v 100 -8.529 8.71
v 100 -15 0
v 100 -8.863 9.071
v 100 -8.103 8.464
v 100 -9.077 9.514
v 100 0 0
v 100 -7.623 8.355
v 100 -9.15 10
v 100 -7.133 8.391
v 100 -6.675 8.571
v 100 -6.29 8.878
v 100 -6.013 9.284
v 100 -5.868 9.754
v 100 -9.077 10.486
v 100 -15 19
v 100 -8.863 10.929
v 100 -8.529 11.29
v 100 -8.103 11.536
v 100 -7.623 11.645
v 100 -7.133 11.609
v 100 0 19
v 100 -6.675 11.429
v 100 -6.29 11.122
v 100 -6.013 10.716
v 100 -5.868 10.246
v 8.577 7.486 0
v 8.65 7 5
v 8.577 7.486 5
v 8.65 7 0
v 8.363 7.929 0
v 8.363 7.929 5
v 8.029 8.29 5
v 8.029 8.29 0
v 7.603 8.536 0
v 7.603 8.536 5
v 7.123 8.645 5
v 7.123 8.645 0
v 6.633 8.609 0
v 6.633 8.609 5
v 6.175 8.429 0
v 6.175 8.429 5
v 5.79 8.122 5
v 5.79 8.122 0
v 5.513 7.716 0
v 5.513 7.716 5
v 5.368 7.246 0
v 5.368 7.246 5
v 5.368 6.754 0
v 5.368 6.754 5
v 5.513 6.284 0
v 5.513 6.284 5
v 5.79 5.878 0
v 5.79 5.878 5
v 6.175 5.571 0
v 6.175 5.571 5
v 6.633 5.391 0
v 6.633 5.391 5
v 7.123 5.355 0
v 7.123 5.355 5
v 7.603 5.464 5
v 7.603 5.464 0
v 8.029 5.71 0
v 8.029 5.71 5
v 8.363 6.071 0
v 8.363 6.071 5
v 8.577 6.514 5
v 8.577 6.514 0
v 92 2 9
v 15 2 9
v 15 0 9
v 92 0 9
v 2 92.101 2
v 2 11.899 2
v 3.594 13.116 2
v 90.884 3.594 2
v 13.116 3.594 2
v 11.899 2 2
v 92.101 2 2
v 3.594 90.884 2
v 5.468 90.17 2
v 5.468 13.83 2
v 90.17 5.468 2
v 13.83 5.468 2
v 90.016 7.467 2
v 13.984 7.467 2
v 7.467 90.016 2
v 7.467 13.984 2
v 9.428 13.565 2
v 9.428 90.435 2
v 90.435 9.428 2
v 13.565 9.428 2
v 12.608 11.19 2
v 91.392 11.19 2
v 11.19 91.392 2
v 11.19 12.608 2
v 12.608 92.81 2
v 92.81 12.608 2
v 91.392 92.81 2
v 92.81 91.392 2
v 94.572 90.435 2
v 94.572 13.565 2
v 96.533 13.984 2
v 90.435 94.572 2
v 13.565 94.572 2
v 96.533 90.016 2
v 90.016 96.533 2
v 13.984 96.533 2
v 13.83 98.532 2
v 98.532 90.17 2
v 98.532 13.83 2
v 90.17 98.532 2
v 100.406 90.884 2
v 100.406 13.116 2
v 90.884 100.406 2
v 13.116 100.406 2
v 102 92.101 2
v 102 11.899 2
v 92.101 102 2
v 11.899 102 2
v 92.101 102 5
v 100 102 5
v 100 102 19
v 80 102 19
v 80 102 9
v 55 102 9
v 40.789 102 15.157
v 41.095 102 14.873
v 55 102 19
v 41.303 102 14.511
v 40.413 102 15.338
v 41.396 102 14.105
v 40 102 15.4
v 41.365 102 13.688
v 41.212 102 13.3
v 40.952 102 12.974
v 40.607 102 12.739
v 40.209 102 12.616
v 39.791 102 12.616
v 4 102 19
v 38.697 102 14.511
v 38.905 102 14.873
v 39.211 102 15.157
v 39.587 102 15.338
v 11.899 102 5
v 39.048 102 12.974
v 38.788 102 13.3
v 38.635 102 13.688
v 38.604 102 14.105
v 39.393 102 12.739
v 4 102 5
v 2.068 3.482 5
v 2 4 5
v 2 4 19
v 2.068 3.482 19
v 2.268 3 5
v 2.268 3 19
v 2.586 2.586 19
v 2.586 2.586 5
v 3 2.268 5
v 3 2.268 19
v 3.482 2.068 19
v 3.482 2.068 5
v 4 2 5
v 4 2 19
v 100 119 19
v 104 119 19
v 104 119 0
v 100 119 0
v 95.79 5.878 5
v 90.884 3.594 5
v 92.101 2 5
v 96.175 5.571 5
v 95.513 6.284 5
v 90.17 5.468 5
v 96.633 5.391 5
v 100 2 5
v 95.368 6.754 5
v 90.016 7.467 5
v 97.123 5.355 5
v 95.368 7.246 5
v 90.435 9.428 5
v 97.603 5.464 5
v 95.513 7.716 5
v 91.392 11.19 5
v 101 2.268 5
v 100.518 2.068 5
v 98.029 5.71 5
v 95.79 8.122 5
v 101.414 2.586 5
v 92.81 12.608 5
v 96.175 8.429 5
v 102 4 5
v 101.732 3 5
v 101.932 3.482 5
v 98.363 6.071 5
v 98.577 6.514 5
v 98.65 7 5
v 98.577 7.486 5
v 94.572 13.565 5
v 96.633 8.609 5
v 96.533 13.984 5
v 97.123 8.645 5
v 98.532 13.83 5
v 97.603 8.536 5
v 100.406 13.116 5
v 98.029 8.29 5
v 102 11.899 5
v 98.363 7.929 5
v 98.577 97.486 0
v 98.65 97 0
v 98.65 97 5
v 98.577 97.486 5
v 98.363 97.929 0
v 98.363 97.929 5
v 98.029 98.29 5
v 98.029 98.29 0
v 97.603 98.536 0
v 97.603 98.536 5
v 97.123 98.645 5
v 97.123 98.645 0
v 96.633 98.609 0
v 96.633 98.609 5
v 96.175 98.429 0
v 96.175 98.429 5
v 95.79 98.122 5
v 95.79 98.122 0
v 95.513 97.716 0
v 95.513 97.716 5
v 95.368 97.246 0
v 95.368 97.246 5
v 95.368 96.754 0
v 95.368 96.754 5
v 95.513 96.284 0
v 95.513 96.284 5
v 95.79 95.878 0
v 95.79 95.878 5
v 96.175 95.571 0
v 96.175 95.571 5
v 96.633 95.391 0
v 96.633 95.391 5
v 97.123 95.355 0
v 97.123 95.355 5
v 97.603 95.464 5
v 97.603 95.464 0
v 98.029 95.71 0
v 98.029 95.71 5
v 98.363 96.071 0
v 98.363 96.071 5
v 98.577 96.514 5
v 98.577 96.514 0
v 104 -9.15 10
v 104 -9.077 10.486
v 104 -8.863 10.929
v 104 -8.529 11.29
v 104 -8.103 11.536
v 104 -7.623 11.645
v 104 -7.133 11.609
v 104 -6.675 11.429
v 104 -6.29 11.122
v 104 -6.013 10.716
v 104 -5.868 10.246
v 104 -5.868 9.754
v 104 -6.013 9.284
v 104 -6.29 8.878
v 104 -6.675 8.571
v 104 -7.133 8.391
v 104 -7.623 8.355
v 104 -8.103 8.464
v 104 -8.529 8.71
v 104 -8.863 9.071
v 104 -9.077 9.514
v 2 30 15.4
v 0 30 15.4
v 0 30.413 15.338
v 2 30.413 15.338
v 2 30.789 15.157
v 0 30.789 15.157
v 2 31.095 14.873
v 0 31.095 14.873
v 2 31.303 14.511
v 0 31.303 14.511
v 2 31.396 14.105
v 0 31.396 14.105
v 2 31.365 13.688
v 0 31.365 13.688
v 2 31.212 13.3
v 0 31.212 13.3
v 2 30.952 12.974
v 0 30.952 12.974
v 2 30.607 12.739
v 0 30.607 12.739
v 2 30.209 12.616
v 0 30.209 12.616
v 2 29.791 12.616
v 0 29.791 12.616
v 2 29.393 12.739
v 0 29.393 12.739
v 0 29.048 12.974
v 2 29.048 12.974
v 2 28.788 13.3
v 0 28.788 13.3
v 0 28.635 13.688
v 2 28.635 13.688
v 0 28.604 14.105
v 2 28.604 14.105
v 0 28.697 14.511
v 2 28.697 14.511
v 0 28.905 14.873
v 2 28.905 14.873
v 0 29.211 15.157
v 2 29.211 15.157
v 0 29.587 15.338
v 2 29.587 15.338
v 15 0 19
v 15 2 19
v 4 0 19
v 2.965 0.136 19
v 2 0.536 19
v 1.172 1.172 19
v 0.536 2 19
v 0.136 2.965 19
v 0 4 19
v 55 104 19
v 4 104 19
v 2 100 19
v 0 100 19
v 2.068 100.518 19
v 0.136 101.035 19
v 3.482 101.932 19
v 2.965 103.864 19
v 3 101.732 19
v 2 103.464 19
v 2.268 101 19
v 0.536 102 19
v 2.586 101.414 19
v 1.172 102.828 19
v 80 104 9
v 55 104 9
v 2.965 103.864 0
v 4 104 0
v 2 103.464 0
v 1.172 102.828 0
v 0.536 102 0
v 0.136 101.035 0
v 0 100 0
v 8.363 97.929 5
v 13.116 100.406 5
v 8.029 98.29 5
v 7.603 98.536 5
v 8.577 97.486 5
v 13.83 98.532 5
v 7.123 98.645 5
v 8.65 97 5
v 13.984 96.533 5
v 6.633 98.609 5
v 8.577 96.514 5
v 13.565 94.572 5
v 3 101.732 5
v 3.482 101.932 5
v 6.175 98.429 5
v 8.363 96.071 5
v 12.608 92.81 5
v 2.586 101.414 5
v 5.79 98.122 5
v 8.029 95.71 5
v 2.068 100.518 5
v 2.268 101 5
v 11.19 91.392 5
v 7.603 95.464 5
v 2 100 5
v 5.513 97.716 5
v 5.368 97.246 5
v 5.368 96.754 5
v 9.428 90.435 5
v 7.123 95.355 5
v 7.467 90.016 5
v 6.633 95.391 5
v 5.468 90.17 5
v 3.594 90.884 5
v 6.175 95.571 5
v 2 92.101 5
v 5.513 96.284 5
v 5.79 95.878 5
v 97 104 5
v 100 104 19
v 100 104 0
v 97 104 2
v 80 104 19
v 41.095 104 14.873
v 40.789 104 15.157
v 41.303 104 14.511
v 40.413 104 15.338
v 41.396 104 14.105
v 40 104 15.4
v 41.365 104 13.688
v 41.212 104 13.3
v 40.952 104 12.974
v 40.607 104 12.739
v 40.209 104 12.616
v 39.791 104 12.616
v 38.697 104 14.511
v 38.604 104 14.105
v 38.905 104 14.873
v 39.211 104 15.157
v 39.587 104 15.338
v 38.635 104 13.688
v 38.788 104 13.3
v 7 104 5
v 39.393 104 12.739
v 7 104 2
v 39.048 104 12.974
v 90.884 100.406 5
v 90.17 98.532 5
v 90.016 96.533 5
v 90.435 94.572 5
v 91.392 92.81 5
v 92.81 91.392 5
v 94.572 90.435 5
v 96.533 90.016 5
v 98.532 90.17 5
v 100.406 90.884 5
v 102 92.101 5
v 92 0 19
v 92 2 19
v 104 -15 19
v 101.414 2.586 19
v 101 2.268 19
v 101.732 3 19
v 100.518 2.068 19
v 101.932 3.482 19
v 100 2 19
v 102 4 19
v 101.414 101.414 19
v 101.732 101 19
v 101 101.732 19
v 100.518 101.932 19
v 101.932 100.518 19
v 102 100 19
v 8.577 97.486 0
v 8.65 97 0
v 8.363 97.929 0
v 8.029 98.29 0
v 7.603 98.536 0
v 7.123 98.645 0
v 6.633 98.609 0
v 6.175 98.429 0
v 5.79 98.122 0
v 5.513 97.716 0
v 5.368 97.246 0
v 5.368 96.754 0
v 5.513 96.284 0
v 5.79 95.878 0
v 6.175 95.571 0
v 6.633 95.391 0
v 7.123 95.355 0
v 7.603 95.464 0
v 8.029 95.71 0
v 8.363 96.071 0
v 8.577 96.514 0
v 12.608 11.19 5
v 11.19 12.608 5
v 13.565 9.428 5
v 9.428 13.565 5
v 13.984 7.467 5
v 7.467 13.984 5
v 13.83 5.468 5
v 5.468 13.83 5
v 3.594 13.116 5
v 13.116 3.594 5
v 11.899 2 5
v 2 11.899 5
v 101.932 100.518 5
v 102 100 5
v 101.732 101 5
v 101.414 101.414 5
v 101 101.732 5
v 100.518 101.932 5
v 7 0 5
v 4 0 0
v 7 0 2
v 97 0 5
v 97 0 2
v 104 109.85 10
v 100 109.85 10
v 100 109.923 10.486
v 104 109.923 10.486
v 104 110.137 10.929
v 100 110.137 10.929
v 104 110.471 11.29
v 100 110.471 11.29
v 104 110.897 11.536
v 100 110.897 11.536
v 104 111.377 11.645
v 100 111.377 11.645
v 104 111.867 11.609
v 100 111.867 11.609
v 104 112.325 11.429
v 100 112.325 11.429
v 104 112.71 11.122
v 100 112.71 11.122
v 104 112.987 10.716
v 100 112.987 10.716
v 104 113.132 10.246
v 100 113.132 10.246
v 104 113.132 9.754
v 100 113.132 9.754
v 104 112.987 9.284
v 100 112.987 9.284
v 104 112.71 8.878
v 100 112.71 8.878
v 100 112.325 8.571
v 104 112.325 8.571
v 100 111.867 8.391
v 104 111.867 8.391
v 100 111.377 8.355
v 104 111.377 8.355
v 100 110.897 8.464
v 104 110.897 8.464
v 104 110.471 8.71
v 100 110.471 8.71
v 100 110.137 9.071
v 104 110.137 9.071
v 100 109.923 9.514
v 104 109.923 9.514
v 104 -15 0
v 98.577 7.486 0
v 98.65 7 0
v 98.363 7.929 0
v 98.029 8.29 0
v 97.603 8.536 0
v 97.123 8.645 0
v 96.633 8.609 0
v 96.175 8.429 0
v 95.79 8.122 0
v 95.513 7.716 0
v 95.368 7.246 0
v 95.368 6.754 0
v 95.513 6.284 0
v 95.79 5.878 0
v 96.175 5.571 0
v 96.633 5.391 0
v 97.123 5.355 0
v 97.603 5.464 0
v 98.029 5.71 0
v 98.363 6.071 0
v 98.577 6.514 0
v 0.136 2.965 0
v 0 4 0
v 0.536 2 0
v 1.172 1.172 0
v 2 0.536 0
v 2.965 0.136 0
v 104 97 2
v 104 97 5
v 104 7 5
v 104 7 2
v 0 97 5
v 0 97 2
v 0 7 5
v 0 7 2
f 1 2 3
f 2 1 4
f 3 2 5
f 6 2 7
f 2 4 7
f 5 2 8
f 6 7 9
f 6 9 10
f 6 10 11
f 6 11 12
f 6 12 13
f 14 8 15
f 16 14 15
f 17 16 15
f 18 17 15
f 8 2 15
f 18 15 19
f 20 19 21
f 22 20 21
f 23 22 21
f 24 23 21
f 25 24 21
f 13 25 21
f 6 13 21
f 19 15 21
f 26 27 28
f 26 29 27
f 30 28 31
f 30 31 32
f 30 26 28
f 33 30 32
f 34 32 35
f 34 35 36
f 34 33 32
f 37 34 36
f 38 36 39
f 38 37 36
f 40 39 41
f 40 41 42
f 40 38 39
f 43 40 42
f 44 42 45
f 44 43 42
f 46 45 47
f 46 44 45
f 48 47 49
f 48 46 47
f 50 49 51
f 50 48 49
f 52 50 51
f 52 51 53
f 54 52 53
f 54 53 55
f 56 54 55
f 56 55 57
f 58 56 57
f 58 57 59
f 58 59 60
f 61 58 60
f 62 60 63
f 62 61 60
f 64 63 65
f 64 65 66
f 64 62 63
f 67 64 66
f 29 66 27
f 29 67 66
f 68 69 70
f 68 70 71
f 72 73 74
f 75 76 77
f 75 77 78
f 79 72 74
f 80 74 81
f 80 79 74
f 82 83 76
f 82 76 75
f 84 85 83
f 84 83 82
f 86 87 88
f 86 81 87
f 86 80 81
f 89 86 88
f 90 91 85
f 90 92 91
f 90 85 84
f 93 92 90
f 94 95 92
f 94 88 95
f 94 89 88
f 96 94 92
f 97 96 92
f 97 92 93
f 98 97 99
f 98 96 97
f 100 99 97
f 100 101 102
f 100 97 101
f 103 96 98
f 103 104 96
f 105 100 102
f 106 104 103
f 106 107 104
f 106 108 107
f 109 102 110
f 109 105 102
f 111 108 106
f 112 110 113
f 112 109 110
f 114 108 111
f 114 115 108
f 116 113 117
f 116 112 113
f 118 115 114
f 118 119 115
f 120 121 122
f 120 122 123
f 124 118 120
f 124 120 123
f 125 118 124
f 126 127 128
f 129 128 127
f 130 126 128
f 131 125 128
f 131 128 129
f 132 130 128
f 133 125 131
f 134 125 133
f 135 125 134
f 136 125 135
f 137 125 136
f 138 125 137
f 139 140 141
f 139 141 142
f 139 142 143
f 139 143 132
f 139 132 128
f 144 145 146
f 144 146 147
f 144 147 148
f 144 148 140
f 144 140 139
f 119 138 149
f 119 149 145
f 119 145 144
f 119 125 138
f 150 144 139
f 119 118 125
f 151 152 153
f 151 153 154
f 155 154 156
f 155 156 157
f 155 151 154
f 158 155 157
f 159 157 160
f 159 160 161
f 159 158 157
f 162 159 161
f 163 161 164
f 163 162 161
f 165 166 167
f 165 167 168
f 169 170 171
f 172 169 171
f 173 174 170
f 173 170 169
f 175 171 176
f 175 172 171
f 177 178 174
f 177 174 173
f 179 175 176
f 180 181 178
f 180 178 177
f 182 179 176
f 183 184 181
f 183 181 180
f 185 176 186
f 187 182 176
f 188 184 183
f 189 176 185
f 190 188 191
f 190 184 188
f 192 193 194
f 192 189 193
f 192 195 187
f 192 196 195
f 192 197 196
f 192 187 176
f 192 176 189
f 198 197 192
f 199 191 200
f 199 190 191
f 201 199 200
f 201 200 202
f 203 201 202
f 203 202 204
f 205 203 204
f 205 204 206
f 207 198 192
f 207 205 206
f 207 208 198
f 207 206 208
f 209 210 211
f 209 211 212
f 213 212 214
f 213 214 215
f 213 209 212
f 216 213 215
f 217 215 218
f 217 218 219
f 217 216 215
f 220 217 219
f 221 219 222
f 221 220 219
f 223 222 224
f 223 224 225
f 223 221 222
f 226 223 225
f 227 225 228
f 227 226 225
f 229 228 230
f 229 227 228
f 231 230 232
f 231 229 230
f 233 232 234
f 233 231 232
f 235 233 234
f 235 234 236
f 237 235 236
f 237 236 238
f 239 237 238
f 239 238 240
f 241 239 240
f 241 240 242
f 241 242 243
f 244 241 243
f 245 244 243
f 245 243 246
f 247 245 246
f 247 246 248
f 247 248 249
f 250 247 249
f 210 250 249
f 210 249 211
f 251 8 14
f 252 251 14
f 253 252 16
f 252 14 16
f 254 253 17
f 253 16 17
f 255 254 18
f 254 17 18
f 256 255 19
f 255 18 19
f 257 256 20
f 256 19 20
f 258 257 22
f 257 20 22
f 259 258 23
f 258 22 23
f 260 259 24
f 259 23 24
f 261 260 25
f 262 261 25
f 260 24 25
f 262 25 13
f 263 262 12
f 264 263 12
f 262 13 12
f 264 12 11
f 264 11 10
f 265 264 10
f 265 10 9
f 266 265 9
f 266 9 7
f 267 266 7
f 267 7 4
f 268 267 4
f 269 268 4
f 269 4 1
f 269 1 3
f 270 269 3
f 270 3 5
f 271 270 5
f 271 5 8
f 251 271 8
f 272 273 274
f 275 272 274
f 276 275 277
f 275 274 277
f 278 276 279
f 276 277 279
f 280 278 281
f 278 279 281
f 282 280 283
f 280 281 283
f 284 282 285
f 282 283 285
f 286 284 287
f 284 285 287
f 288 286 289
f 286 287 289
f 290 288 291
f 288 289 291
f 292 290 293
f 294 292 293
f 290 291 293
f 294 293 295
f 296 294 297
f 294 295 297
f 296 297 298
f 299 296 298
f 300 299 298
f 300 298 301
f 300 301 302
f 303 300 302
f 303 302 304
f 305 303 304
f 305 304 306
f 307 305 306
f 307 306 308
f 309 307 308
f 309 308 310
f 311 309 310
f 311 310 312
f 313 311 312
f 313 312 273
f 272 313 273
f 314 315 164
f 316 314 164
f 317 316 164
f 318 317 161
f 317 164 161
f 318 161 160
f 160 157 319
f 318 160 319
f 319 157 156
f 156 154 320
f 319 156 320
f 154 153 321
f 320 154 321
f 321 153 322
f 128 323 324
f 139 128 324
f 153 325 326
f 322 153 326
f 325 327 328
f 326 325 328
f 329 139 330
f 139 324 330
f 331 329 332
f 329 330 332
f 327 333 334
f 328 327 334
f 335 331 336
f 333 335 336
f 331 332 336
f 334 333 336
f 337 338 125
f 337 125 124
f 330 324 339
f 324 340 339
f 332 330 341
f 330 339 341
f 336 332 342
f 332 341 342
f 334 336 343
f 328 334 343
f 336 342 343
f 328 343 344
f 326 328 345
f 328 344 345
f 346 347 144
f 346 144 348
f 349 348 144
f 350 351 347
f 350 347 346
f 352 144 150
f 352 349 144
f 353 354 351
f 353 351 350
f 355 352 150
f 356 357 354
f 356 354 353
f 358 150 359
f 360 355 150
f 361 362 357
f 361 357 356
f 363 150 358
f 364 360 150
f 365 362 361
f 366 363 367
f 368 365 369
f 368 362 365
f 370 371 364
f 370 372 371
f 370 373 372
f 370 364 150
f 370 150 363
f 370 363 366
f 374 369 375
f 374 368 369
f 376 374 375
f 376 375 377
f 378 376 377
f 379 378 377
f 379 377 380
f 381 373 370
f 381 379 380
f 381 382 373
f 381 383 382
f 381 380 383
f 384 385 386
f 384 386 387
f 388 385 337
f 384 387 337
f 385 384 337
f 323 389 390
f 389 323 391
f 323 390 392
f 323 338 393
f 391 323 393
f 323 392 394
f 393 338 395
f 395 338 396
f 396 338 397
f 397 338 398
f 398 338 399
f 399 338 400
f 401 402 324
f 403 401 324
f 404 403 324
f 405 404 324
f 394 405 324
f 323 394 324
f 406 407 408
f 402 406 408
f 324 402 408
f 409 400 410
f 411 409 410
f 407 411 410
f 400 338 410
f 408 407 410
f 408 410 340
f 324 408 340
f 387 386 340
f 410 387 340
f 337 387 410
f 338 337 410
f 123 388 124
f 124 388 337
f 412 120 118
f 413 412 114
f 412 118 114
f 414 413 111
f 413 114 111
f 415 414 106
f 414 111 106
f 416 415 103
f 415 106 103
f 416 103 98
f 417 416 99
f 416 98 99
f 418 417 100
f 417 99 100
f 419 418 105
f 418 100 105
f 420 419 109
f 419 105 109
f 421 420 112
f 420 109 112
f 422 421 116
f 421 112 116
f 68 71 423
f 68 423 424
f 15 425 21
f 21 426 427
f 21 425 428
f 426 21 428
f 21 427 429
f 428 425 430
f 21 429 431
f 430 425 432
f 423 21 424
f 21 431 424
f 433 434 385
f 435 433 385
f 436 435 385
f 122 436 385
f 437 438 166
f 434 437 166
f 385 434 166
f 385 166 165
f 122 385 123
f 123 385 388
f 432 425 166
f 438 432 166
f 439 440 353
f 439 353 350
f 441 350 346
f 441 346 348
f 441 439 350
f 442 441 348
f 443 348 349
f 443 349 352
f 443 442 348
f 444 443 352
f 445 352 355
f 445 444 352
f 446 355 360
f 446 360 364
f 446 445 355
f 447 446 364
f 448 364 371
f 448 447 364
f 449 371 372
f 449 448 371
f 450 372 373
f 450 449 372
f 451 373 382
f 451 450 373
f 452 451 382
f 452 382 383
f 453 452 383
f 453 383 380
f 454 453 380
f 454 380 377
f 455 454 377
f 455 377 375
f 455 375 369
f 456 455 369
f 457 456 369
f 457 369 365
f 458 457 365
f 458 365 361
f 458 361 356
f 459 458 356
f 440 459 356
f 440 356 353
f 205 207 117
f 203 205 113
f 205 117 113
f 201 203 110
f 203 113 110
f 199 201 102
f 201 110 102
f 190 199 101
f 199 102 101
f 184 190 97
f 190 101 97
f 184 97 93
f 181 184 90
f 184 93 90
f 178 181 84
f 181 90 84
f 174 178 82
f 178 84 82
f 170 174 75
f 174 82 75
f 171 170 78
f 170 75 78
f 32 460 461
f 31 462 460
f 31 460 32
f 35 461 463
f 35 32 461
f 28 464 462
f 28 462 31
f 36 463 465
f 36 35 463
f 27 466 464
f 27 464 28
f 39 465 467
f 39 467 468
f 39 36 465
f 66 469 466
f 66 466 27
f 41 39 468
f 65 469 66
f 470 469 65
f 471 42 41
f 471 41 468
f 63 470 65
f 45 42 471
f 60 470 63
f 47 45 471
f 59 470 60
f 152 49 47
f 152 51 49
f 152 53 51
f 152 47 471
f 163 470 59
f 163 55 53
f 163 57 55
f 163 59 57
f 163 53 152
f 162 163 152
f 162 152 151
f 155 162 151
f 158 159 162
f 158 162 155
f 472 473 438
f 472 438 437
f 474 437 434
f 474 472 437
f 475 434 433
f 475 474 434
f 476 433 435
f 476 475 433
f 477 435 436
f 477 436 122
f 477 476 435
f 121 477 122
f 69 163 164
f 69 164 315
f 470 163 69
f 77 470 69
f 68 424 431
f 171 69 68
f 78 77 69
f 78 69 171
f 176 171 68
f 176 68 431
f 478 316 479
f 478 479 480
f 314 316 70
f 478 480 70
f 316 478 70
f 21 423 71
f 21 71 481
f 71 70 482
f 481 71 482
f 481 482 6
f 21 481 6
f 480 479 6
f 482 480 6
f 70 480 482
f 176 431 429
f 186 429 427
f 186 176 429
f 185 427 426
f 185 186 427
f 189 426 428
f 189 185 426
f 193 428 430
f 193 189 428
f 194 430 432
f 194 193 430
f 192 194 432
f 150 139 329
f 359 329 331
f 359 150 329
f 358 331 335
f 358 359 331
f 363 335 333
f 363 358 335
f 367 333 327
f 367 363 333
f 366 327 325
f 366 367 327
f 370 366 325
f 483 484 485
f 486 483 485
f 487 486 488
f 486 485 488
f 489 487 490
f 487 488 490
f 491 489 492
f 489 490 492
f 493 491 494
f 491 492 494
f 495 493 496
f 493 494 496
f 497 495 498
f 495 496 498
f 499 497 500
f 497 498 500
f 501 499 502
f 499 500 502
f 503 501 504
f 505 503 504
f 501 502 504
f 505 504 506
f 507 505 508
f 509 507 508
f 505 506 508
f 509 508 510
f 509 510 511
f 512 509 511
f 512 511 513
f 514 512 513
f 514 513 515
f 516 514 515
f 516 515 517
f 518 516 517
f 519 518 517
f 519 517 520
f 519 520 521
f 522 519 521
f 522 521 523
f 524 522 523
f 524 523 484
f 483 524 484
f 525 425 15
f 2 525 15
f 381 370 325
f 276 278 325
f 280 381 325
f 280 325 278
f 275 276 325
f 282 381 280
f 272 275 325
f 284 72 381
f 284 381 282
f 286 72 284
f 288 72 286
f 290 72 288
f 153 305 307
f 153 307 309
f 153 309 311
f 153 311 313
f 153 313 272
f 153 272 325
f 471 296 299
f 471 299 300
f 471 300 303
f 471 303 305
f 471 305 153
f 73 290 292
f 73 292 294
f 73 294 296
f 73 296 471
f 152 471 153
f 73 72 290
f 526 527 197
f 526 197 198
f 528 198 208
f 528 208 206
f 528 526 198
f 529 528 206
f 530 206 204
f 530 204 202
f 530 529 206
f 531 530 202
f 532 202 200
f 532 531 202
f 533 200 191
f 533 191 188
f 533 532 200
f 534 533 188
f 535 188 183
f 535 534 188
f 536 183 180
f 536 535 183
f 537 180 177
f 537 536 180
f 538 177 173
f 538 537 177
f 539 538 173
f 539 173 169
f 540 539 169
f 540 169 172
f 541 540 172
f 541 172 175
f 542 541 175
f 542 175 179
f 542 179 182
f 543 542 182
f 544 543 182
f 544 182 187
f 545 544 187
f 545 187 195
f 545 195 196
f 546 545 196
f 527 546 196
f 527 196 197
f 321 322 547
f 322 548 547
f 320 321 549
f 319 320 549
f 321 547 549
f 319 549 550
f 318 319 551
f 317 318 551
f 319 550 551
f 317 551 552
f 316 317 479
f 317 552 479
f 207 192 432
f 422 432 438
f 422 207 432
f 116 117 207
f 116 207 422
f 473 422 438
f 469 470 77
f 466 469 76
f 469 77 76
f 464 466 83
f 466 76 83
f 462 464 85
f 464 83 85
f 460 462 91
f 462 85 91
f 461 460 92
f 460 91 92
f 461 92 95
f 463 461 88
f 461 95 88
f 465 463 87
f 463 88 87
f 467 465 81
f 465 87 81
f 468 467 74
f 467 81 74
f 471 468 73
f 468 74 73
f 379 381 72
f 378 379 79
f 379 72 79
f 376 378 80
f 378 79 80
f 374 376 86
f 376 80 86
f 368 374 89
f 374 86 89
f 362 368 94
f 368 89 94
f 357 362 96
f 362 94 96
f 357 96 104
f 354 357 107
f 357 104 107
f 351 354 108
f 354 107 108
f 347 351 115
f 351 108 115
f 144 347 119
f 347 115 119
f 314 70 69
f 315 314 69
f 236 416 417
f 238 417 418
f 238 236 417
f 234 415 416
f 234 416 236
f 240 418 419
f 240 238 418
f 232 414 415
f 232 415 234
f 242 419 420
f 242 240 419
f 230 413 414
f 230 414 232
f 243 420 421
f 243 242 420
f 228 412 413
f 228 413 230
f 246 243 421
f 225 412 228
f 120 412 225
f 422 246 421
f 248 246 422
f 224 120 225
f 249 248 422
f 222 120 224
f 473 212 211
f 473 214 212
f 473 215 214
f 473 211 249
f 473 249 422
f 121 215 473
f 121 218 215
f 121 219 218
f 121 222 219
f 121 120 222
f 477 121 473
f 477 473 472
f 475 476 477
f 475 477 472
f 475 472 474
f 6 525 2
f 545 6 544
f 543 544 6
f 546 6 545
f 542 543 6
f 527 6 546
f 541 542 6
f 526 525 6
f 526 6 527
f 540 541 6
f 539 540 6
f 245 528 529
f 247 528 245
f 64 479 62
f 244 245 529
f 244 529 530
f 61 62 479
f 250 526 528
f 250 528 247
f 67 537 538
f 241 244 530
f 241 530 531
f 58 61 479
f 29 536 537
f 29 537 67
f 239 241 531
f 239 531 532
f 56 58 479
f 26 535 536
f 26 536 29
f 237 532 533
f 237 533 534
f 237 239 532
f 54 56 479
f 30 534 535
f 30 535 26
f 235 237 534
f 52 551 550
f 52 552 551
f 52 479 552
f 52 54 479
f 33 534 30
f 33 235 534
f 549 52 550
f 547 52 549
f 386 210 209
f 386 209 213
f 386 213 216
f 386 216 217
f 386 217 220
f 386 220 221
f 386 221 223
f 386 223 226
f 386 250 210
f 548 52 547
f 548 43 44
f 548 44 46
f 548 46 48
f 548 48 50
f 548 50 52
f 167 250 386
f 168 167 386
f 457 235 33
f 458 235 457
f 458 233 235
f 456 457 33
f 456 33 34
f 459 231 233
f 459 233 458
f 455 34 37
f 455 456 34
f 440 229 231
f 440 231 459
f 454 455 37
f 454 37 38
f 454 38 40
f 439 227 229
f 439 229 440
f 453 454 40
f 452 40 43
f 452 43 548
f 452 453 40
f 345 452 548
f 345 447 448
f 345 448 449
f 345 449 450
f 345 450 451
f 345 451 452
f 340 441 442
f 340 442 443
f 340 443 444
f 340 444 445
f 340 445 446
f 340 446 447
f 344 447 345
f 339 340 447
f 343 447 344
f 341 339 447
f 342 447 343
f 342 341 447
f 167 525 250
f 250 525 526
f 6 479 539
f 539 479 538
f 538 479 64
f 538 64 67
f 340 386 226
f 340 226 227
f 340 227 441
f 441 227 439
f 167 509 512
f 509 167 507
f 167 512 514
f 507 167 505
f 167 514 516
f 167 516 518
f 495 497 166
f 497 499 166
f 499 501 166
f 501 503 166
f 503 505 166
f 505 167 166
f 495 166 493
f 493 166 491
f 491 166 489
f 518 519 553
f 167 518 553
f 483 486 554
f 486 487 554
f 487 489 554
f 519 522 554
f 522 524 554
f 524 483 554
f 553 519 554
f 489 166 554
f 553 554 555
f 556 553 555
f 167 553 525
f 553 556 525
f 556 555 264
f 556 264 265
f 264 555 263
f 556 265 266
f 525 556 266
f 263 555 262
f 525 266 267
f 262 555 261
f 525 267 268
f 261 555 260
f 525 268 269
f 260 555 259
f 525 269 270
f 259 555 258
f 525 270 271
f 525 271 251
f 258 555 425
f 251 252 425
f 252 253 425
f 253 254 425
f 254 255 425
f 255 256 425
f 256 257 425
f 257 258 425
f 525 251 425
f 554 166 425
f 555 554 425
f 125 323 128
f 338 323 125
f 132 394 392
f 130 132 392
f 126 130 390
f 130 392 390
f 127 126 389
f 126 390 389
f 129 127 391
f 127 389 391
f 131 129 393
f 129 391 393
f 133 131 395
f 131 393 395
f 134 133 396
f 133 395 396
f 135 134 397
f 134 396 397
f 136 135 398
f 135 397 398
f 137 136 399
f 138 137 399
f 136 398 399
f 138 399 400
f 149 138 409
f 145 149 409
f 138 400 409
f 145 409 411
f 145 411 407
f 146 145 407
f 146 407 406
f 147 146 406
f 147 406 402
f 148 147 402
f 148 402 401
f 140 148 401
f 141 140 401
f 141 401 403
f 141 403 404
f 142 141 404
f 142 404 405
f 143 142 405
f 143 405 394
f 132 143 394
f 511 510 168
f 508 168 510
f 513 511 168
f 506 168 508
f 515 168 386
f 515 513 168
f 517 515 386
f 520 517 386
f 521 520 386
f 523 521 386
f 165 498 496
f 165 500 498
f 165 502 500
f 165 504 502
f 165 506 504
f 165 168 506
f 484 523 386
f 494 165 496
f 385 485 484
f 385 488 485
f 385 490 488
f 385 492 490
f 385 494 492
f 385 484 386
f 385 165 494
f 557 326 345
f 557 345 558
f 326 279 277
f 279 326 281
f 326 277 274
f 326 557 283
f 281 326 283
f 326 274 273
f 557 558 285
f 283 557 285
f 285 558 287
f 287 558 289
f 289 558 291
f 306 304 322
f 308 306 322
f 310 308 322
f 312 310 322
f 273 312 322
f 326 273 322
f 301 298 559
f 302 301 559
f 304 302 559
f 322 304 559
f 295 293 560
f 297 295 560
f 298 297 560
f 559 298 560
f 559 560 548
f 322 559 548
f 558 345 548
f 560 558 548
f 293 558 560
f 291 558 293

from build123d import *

# Parameters (mm, degrees)
SKETCH_1_R          = 1.65
EXTRUDE_1_DEPTH     = 2
SKETCH_2_R          = 7
SKETCH_2_R_2        = 1.65
EXTRUDE_2_DEPTH     = 3
EXTRUDE_3_DEPTH     = 17
EXTRUDE_4_DEPTH     = 19
SKETCH_6_R          = 1.65
CUT_EXTRUDE_1_DEPTH = 10
SKETCH_7_W          = 77
SKETCH_7_H          = 2
CUT_EXTRUDE_2_DEPTH = 10
SKETCH_8_W          = 25
SKETCH_8_H          = 10
CUT_EXTRUDE_3_DEPTH = 10
SKETCH_9_R          = 1.4
CUT_EXTRUDE_4_DEPTH = 22
SKETCH_10_R         = 1.4
CUT_EXTRUDE_5_DEPTH = 22


with BuildPart() as part:
    # 草图1 → 凸台-拉伸1 (new body)
    with BuildSketch(Plane.XY):
        with BuildLine():
            Line((4, 0), (100, 0))
            ThreePointArc((100, 0), (102.828427125, 1.171572875), (104, 4))
            Line((104, 4), (104, 100))
            ThreePointArc((104, 100), (102.828427125, 102.828427125), (100, 104))
            Line((100, 104), (4, 104))
            ThreePointArc((4, 104), (1.171572875, 102.828427125), (0, 100))
            Line((0, 100), (0, 4))
            ThreePointArc((0, 4), (1.171572875, 1.171572875), (4, 0))
        make_face()
        with Locations((7, 97)):
            Circle(SKETCH_1_R, mode=Mode.SUBTRACT)
        with Locations((97, 97)):
            Circle(SKETCH_1_R, mode=Mode.SUBTRACT)
        with Locations((7, 7)):
            Circle(SKETCH_1_R, mode=Mode.SUBTRACT)
        with Locations((97, 7)):
            Circle(SKETCH_1_R, mode=Mode.SUBTRACT)
    extrude(amount=EXTRUDE_1_DEPTH)

    # 草图2 → 凸台-拉伸2 (add)
    # profile 1 of 4: a face of its own
    with BuildSketch(Plane.XY.offset(2)):
        with Locations(Location((7, 7, 0), (0, 0, 180))):
            Circle(SKETCH_2_R)
        with Locations((7, 7)):
            Circle(SKETCH_2_R_2, mode=Mode.SUBTRACT)
    # profile 2 of 4: a face of its own
    with BuildSketch(Plane.XY.offset(2)):
        with Locations((97, 7)):
            Circle(SKETCH_2_R)
        with Locations((97, 7)):
            Circle(SKETCH_2_R_2, mode=Mode.SUBTRACT)
    # profile 3 of 4: a face of its own
    with BuildSketch(Plane.XY.offset(2)):
        with Locations(Location((7, 97, 0), (0, 0, 180))):
            Circle(SKETCH_2_R)
        with Locations((7, 97)):
            Circle(SKETCH_2_R_2, mode=Mode.SUBTRACT)
    # profile 4 of 4: a face of its own
    with BuildSketch(Plane.XY.offset(2)):
        with Locations((97, 97)):
            Circle(SKETCH_2_R)
        with Locations((97, 97)):
            Circle(SKETCH_2_R_2, mode=Mode.SUBTRACT)
    extrude(amount=EXTRUDE_2_DEPTH)

    # 草图3 → 凸台-拉伸3 (add)
    with BuildSketch(Plane.XY.offset(2)):
        with BuildLine():
            Line((100, 104), (4, 104))
            ThreePointArc((4, 104), (1.171572875, 102.828427125), (0, 100))
            Line((0, 100), (0, 4))
            ThreePointArc((0, 4), (1.171572875, 1.171572875), (4, 0))
            Line((4, 0), (100, 0))
            ThreePointArc((100, 0), (102.828427125, 1.171572875), (104, 4))
            Line((104, 4), (104, 100))
            ThreePointArc((104, 100), (102.828427125, 102.828427125), (100, 104))
        make_face()
        with BuildLine():
            Line((100, 102), (4, 102))
            ThreePointArc((4, 102), (2.585786438, 101.414213562), (2, 100))
            Line((2, 100), (2, 4))
            ThreePointArc((2, 4), (2.585786438, 2.585786438), (4, 2))
            Line((4, 2), (100, 2))
            ThreePointArc((100, 2), (101.414213562, 2.585786438), (102, 4))
            Line((102, 4), (102, 100))
            ThreePointArc((102, 100), (101.414213562, 101.414213562), (100, 102))
        make_face(mode=Mode.SUBTRACT)
    extrude(amount=EXTRUDE_3_DEPTH)

    # 草图5 → 凸台-拉伸4 (add, through all)
    with BuildSketch(Plane.XY.offset(19)):
        with BuildLine():
            Line((104, 4), (104, -15))
            Line((104, -15), (100, -15))
            Line((100, -15), (100, 0))
            ThreePointArc((100, 0), (102.828427125, 1.171572875), (104, 4))
        make_face()
        with BuildLine():
            Line((104, 100), (104, 119))
            Line((104, 119), (100, 119))
            Line((100, 119), (100, 104))
            ThreePointArc((100, 104), (102.828427125, 102.828427125), (104, 100))
        make_face()
    extrude(amount=-EXTRUDE_4_DEPTH)

    # 草图6 → 切除-拉伸1 (cut)
    with BuildSketch(Plane.ZY.offset(-100)):
        with Locations(Location((10, -7.5, 0), (0, 0, 270))):
            Circle(SKETCH_6_R)
        with Locations(Location((10, 111.5, 0), (0, 0, 270))):
            Circle(SKETCH_6_R)
    extrude(amount=-CUT_EXTRUDE_1_DEPTH, mode=Mode.SUBTRACT)

    # 草图7 → 切除-拉伸2 (cut)
    with BuildSketch(Plane.XY.offset(19)):
        with Locations((53.5, 1)):
            Rectangle(SKETCH_7_W, SKETCH_7_H)
    extrude(amount=-CUT_EXTRUDE_2_DEPTH, mode=Mode.SUBTRACT)

    # 草图8 → 切除-拉伸3 (cut)
    with BuildSketch(Plane(origin=(0, 104, 0), x_dir=(1, 0, 0), z_dir=(0, 1, 0))):
        with Locations((67.5, -14)):
            Rectangle(SKETCH_8_W, SKETCH_8_H)
    extrude(amount=-CUT_EXTRUDE_3_DEPTH, mode=Mode.SUBTRACT)

    # 草图9 → 切除-拉伸4 (cut)
    with BuildSketch(Plane(origin=(0, 104, 0), x_dir=(1, 0, 0), z_dir=(0, 1, 0))):
        with Locations(Location((40, -14, 0), (0, 0, 270))):
            Circle(SKETCH_9_R)
    extrude(amount=-CUT_EXTRUDE_4_DEPTH, mode=Mode.SUBTRACT)

    # 草图10 → 切除-拉伸5 (cut)
    with BuildSketch(Plane.ZY):
        with Locations((14, 30)):
            Circle(SKETCH_10_R)
    extrude(amount=-CUT_EXTRUDE_5_DEPTH, mode=Mode.SUBTRACT)


solid = part.part
